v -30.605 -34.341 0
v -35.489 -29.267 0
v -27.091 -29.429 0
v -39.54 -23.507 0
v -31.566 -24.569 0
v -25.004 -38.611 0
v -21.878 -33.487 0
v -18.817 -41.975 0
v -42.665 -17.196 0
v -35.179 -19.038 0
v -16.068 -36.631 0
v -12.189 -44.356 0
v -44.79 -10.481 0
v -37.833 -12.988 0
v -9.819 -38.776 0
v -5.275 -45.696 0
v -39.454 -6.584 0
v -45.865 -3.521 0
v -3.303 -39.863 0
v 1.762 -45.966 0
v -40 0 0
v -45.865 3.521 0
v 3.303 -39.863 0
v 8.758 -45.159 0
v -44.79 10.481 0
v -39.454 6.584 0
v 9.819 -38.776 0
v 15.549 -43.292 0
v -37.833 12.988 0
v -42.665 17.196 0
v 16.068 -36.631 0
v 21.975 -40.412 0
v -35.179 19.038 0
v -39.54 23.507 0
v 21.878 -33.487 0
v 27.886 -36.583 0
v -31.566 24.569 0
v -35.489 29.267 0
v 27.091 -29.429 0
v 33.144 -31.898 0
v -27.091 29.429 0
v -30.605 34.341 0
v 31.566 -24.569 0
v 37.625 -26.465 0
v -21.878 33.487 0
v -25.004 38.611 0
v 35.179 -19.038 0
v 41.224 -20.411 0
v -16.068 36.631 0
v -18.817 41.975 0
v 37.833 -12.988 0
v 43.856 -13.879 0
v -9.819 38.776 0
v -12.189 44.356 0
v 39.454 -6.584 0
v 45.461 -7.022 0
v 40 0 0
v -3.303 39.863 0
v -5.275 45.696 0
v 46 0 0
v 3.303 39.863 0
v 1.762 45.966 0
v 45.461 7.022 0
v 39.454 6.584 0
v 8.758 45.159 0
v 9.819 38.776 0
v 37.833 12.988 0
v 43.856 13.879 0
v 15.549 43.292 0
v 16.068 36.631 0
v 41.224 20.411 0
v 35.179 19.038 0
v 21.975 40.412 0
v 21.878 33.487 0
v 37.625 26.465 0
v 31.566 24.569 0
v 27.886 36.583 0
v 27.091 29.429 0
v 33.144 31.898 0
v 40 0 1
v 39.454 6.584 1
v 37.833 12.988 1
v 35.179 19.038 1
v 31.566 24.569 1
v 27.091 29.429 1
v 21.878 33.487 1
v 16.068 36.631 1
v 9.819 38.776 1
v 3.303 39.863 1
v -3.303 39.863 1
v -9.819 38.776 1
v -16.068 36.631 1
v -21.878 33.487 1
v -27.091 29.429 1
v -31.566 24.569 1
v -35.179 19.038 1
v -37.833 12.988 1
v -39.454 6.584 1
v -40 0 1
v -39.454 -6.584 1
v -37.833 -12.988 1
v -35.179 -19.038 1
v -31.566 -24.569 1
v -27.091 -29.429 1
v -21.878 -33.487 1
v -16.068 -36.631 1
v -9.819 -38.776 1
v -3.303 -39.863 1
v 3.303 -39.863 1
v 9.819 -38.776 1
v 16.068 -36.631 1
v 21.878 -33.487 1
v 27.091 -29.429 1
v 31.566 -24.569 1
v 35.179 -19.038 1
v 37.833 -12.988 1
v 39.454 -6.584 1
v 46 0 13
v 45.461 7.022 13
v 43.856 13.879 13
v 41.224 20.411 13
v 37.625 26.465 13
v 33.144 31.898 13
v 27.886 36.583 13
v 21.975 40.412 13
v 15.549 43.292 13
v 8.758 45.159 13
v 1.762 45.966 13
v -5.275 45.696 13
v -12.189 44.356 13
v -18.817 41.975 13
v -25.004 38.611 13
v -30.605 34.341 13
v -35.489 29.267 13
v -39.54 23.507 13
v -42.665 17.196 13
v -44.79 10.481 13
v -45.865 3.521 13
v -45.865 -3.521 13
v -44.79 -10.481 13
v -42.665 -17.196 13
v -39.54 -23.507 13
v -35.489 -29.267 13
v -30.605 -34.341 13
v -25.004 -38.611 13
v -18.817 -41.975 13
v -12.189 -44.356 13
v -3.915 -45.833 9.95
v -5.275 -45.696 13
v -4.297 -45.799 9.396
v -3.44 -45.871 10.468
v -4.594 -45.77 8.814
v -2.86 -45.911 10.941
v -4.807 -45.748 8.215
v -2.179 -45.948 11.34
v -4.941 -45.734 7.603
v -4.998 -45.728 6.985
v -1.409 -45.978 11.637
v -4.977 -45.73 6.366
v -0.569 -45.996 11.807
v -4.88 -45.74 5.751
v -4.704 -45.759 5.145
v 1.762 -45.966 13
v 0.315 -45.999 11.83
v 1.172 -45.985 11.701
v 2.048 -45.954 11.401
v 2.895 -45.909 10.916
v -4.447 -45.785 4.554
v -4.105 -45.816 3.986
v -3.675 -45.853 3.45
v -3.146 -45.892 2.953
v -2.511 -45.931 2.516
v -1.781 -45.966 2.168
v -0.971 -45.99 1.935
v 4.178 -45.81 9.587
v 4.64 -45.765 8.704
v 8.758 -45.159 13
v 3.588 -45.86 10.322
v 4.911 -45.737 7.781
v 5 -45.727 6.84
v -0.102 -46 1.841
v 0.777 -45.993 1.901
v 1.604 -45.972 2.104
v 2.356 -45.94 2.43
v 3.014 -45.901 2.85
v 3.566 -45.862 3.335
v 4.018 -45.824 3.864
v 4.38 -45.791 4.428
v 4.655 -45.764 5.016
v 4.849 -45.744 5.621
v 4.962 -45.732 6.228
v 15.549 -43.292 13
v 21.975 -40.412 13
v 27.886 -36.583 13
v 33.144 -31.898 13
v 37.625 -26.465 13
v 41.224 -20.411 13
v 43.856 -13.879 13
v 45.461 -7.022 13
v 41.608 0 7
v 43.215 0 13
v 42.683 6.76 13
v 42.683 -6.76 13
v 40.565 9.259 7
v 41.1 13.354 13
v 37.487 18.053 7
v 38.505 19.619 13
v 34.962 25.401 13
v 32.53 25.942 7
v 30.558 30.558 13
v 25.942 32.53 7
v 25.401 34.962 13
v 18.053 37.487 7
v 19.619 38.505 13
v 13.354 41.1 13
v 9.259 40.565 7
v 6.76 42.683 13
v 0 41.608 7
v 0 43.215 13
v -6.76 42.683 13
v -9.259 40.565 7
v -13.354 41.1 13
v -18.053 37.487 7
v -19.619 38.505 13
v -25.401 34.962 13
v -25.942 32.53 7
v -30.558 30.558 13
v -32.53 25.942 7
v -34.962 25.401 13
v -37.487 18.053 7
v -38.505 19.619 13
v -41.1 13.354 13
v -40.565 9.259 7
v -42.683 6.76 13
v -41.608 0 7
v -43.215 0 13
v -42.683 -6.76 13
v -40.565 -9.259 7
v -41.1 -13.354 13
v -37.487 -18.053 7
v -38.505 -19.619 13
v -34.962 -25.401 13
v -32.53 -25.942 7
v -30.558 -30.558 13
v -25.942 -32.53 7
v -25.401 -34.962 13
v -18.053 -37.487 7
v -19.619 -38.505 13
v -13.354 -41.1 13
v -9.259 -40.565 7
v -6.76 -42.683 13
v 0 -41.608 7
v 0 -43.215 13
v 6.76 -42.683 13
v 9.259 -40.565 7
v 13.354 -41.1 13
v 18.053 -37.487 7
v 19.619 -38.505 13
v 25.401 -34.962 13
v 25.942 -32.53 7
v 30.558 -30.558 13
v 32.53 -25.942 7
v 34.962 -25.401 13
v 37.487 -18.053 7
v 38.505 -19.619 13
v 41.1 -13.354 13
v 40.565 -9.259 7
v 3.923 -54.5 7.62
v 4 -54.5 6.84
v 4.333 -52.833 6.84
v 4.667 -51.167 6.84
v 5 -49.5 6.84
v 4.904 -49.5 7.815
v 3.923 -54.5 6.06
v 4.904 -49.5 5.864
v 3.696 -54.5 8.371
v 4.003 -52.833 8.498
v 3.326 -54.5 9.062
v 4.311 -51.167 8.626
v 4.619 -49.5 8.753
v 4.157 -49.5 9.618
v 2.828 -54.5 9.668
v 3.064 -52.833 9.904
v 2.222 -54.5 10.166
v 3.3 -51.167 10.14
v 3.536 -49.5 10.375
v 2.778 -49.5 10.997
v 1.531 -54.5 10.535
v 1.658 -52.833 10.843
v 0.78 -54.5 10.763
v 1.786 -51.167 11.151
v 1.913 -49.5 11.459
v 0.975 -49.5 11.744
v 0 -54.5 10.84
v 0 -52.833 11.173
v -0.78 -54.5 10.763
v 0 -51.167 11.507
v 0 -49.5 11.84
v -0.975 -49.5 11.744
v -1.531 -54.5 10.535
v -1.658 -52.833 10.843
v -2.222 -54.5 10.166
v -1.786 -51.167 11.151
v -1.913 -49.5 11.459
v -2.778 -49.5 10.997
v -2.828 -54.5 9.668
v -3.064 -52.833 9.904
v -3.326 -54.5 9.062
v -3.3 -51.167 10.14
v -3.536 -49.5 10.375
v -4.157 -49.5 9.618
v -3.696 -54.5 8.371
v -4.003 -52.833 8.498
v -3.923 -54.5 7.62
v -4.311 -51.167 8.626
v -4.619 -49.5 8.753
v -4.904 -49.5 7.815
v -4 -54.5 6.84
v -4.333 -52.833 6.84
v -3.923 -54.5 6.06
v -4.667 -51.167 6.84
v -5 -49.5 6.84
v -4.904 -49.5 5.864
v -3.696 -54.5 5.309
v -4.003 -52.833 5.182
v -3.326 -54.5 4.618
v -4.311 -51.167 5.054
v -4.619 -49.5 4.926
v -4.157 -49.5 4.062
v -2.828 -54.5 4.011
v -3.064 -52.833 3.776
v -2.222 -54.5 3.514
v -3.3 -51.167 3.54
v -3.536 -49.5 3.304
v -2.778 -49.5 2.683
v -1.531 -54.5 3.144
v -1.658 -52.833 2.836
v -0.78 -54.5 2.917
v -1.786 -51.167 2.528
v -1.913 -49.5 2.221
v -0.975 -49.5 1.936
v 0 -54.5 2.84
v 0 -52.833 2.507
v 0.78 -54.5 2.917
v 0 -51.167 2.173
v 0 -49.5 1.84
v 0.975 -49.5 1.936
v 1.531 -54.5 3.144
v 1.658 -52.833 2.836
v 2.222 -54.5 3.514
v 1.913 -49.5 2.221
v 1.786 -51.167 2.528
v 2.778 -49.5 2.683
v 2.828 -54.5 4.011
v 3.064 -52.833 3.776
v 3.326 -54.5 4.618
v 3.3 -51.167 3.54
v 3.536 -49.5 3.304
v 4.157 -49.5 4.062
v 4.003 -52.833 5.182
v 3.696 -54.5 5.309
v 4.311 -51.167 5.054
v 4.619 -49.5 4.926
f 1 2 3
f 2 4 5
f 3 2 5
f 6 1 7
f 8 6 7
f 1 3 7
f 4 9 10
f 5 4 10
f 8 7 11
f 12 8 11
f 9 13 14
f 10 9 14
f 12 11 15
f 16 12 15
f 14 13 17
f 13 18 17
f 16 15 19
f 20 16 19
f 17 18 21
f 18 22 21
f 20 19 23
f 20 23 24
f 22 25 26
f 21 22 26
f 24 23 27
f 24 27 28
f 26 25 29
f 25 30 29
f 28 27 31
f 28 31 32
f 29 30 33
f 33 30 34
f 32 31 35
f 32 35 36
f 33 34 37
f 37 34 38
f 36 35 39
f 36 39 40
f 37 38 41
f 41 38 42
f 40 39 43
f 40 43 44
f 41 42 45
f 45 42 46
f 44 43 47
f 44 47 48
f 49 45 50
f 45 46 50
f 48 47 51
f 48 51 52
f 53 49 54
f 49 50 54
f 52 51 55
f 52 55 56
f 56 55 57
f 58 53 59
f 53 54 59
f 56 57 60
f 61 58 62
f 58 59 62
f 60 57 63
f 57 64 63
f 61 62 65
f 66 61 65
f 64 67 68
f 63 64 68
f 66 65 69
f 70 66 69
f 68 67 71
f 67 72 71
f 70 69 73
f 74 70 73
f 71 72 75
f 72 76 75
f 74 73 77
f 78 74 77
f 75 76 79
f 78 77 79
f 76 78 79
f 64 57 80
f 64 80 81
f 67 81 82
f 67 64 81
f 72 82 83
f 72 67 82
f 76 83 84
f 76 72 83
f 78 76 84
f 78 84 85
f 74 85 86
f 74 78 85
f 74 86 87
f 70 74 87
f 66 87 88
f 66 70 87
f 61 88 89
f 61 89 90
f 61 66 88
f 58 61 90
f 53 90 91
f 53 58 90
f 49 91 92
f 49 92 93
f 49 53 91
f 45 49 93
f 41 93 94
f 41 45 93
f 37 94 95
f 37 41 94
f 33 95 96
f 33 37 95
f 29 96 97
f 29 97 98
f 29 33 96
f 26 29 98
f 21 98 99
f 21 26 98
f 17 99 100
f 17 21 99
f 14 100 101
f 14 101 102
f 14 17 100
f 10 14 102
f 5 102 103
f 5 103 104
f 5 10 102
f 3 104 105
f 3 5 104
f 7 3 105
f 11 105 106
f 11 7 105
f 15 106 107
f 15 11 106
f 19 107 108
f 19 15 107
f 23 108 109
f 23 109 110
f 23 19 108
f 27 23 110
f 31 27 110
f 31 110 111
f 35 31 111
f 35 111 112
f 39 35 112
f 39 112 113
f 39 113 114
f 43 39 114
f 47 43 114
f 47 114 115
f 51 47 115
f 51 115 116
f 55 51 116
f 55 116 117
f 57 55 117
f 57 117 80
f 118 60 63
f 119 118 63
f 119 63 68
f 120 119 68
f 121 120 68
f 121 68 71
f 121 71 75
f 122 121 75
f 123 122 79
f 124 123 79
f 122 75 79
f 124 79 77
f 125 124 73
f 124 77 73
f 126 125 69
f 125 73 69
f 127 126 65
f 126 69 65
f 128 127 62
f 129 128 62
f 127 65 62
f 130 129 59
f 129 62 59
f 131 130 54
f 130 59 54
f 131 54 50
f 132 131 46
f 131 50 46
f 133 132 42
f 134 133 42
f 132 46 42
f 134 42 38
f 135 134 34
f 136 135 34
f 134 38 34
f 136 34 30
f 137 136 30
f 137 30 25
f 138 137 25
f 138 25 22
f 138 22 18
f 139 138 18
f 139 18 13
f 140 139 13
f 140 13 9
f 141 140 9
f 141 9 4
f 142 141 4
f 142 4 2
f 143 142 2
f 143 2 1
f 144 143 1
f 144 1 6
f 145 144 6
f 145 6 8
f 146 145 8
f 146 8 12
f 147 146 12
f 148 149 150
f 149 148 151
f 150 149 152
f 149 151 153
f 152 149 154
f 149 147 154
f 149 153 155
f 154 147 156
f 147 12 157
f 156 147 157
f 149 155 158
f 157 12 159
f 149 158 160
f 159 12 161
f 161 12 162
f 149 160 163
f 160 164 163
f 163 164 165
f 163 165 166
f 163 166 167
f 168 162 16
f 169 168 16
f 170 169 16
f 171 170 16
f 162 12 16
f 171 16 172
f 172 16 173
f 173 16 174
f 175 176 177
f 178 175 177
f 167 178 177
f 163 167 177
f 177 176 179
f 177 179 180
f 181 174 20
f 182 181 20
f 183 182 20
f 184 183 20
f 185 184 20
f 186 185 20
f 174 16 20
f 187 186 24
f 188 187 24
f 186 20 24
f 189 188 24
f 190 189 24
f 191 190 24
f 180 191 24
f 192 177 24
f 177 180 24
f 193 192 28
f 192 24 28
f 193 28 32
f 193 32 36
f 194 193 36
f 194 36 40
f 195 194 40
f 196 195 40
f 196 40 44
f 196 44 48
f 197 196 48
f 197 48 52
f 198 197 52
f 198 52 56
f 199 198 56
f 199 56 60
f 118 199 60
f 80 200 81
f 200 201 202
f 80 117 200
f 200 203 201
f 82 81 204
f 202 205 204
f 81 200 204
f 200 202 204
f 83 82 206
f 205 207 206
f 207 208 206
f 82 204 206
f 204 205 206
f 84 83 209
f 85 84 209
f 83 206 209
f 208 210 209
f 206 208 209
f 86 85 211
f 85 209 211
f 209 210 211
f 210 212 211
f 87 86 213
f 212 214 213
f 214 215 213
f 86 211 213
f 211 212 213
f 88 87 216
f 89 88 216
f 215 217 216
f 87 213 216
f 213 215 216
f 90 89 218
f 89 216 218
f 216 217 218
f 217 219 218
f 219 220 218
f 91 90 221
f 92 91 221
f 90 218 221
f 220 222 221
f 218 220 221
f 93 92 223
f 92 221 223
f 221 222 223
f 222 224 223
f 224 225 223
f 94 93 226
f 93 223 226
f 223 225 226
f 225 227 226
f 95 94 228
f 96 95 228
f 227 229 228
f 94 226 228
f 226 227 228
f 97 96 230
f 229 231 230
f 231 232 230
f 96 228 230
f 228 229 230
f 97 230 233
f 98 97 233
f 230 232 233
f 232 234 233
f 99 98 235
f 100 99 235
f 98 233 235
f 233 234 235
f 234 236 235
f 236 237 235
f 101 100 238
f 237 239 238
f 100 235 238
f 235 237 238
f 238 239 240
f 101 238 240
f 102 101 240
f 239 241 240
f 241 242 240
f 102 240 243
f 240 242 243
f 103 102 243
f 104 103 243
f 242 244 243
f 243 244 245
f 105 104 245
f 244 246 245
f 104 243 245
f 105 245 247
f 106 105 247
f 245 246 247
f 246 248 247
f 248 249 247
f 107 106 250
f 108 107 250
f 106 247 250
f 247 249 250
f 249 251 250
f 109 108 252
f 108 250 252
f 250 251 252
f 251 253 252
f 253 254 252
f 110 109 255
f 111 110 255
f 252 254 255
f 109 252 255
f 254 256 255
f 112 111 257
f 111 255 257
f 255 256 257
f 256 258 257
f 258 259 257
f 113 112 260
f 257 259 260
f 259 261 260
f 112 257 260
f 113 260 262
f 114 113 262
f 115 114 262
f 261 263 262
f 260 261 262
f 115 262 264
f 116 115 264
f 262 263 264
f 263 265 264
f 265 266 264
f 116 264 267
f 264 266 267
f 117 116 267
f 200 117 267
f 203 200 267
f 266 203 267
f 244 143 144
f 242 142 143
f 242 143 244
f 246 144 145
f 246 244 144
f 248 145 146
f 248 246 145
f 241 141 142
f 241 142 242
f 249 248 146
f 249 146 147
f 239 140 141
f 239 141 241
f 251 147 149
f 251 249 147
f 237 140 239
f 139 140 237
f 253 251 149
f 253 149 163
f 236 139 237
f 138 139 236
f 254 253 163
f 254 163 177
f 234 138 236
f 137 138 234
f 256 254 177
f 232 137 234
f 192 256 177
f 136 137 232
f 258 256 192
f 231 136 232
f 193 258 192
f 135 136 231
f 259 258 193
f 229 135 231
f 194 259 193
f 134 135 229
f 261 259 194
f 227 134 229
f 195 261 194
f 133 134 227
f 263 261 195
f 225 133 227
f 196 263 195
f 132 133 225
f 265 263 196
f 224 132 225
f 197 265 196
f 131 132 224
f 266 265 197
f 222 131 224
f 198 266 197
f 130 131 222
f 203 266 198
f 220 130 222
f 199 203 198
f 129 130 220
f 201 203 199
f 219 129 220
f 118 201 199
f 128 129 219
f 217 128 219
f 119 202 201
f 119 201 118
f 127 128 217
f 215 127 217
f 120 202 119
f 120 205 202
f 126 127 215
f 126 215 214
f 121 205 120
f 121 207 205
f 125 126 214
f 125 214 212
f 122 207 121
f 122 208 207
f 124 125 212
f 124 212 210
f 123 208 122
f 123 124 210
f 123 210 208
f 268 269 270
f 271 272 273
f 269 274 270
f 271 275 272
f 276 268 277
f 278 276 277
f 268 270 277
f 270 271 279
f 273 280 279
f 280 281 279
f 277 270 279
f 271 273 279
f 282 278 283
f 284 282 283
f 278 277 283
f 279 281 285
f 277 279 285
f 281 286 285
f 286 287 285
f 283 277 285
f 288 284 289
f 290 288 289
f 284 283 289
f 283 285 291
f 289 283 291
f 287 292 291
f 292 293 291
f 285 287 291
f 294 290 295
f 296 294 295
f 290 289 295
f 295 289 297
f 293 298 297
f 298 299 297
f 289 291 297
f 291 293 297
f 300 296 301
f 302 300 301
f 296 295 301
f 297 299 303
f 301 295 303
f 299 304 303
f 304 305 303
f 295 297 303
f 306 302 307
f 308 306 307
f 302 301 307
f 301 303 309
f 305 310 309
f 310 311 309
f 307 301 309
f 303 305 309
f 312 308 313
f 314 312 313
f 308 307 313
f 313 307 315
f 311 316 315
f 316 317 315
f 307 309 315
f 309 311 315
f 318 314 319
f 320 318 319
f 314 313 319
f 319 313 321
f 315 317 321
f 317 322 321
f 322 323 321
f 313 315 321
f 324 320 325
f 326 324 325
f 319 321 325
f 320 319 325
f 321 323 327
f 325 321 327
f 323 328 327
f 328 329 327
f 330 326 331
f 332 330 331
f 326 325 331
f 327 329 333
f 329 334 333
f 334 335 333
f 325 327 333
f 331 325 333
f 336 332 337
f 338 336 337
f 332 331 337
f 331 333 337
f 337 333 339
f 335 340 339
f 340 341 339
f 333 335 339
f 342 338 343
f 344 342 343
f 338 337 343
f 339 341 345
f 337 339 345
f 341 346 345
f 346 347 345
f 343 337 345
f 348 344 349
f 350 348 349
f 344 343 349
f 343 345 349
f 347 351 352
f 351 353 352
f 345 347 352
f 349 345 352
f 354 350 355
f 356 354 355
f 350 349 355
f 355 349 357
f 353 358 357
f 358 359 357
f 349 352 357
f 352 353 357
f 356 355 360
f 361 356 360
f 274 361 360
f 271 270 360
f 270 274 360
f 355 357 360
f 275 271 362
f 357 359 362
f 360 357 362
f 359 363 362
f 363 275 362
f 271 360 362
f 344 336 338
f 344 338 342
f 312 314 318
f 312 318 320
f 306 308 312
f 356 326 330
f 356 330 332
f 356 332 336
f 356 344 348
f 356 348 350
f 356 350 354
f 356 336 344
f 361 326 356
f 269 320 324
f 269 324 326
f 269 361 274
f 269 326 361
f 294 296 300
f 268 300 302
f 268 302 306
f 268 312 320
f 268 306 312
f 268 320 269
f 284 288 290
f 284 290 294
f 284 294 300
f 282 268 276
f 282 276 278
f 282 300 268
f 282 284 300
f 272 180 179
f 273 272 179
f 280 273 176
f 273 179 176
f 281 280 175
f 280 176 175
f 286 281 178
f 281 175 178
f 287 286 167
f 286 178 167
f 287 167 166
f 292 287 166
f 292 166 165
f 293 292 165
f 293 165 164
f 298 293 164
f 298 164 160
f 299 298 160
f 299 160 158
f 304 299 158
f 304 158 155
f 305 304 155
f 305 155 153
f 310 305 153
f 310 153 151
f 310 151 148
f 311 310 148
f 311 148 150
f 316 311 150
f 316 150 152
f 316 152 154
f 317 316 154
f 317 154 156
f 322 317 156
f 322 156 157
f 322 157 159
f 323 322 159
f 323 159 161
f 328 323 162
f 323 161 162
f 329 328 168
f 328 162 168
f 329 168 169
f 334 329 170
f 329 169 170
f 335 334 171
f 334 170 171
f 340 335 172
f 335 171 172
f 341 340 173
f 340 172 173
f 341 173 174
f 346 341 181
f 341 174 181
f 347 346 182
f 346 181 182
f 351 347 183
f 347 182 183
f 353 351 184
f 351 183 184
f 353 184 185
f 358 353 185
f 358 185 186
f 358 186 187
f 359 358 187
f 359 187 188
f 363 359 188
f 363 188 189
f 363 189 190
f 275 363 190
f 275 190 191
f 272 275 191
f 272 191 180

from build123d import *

# Parameters (mm, degrees)
F0_R     = 46
F0_R_2   = 40
F1_DEPTH = 13
F3_R     = 5
F4_DEPTH = 10
F5_SIZE2 = 3.2153903092
F5_SIZE  = 12
F6_SIZE2 = 5
F6_SIZE  = 1


with BuildPart() as f1:
    # F0 (on Top) → F1 (new body)
    with BuildSketch(Plane.XY):
        Circle(F0_R)
        Circle(F0_R_2, mode=Mode.SUBTRACT)
    extrude(amount=F1_DEPTH)

    # F3 (on offset) → F4 (join)
    with BuildSketch(Plane.XZ.offset(44.5)):
        with Locations((0, 6.839911745)):
            Circle(F3_R)
    extrude(amount=F4_DEPTH)

    # F5
    f5_edges = [f1.edges().sort_by_distance(p)[0] for p in [
        (-40, 0, 13),
    ]]
    f5_side = f1.faces().sort_by_distance((-40, 0, 6.5))[0]
    chamfer(f5_edges, length=F5_SIZE, length2=F5_SIZE2, reference=f5_side)

    # F6
    f6_edges = [f1.edges().sort_by_distance(p)[0] for p in [
        (-5, -54.5, 6.839912),
    ]]
    f6_side = f1.faces().sort_by_distance((0, -54.5, 6.839912))[0]
    chamfer(f6_edges, length=F6_SIZE, length2=F6_SIZE2, reference=f6_side)


solid = f1.part
